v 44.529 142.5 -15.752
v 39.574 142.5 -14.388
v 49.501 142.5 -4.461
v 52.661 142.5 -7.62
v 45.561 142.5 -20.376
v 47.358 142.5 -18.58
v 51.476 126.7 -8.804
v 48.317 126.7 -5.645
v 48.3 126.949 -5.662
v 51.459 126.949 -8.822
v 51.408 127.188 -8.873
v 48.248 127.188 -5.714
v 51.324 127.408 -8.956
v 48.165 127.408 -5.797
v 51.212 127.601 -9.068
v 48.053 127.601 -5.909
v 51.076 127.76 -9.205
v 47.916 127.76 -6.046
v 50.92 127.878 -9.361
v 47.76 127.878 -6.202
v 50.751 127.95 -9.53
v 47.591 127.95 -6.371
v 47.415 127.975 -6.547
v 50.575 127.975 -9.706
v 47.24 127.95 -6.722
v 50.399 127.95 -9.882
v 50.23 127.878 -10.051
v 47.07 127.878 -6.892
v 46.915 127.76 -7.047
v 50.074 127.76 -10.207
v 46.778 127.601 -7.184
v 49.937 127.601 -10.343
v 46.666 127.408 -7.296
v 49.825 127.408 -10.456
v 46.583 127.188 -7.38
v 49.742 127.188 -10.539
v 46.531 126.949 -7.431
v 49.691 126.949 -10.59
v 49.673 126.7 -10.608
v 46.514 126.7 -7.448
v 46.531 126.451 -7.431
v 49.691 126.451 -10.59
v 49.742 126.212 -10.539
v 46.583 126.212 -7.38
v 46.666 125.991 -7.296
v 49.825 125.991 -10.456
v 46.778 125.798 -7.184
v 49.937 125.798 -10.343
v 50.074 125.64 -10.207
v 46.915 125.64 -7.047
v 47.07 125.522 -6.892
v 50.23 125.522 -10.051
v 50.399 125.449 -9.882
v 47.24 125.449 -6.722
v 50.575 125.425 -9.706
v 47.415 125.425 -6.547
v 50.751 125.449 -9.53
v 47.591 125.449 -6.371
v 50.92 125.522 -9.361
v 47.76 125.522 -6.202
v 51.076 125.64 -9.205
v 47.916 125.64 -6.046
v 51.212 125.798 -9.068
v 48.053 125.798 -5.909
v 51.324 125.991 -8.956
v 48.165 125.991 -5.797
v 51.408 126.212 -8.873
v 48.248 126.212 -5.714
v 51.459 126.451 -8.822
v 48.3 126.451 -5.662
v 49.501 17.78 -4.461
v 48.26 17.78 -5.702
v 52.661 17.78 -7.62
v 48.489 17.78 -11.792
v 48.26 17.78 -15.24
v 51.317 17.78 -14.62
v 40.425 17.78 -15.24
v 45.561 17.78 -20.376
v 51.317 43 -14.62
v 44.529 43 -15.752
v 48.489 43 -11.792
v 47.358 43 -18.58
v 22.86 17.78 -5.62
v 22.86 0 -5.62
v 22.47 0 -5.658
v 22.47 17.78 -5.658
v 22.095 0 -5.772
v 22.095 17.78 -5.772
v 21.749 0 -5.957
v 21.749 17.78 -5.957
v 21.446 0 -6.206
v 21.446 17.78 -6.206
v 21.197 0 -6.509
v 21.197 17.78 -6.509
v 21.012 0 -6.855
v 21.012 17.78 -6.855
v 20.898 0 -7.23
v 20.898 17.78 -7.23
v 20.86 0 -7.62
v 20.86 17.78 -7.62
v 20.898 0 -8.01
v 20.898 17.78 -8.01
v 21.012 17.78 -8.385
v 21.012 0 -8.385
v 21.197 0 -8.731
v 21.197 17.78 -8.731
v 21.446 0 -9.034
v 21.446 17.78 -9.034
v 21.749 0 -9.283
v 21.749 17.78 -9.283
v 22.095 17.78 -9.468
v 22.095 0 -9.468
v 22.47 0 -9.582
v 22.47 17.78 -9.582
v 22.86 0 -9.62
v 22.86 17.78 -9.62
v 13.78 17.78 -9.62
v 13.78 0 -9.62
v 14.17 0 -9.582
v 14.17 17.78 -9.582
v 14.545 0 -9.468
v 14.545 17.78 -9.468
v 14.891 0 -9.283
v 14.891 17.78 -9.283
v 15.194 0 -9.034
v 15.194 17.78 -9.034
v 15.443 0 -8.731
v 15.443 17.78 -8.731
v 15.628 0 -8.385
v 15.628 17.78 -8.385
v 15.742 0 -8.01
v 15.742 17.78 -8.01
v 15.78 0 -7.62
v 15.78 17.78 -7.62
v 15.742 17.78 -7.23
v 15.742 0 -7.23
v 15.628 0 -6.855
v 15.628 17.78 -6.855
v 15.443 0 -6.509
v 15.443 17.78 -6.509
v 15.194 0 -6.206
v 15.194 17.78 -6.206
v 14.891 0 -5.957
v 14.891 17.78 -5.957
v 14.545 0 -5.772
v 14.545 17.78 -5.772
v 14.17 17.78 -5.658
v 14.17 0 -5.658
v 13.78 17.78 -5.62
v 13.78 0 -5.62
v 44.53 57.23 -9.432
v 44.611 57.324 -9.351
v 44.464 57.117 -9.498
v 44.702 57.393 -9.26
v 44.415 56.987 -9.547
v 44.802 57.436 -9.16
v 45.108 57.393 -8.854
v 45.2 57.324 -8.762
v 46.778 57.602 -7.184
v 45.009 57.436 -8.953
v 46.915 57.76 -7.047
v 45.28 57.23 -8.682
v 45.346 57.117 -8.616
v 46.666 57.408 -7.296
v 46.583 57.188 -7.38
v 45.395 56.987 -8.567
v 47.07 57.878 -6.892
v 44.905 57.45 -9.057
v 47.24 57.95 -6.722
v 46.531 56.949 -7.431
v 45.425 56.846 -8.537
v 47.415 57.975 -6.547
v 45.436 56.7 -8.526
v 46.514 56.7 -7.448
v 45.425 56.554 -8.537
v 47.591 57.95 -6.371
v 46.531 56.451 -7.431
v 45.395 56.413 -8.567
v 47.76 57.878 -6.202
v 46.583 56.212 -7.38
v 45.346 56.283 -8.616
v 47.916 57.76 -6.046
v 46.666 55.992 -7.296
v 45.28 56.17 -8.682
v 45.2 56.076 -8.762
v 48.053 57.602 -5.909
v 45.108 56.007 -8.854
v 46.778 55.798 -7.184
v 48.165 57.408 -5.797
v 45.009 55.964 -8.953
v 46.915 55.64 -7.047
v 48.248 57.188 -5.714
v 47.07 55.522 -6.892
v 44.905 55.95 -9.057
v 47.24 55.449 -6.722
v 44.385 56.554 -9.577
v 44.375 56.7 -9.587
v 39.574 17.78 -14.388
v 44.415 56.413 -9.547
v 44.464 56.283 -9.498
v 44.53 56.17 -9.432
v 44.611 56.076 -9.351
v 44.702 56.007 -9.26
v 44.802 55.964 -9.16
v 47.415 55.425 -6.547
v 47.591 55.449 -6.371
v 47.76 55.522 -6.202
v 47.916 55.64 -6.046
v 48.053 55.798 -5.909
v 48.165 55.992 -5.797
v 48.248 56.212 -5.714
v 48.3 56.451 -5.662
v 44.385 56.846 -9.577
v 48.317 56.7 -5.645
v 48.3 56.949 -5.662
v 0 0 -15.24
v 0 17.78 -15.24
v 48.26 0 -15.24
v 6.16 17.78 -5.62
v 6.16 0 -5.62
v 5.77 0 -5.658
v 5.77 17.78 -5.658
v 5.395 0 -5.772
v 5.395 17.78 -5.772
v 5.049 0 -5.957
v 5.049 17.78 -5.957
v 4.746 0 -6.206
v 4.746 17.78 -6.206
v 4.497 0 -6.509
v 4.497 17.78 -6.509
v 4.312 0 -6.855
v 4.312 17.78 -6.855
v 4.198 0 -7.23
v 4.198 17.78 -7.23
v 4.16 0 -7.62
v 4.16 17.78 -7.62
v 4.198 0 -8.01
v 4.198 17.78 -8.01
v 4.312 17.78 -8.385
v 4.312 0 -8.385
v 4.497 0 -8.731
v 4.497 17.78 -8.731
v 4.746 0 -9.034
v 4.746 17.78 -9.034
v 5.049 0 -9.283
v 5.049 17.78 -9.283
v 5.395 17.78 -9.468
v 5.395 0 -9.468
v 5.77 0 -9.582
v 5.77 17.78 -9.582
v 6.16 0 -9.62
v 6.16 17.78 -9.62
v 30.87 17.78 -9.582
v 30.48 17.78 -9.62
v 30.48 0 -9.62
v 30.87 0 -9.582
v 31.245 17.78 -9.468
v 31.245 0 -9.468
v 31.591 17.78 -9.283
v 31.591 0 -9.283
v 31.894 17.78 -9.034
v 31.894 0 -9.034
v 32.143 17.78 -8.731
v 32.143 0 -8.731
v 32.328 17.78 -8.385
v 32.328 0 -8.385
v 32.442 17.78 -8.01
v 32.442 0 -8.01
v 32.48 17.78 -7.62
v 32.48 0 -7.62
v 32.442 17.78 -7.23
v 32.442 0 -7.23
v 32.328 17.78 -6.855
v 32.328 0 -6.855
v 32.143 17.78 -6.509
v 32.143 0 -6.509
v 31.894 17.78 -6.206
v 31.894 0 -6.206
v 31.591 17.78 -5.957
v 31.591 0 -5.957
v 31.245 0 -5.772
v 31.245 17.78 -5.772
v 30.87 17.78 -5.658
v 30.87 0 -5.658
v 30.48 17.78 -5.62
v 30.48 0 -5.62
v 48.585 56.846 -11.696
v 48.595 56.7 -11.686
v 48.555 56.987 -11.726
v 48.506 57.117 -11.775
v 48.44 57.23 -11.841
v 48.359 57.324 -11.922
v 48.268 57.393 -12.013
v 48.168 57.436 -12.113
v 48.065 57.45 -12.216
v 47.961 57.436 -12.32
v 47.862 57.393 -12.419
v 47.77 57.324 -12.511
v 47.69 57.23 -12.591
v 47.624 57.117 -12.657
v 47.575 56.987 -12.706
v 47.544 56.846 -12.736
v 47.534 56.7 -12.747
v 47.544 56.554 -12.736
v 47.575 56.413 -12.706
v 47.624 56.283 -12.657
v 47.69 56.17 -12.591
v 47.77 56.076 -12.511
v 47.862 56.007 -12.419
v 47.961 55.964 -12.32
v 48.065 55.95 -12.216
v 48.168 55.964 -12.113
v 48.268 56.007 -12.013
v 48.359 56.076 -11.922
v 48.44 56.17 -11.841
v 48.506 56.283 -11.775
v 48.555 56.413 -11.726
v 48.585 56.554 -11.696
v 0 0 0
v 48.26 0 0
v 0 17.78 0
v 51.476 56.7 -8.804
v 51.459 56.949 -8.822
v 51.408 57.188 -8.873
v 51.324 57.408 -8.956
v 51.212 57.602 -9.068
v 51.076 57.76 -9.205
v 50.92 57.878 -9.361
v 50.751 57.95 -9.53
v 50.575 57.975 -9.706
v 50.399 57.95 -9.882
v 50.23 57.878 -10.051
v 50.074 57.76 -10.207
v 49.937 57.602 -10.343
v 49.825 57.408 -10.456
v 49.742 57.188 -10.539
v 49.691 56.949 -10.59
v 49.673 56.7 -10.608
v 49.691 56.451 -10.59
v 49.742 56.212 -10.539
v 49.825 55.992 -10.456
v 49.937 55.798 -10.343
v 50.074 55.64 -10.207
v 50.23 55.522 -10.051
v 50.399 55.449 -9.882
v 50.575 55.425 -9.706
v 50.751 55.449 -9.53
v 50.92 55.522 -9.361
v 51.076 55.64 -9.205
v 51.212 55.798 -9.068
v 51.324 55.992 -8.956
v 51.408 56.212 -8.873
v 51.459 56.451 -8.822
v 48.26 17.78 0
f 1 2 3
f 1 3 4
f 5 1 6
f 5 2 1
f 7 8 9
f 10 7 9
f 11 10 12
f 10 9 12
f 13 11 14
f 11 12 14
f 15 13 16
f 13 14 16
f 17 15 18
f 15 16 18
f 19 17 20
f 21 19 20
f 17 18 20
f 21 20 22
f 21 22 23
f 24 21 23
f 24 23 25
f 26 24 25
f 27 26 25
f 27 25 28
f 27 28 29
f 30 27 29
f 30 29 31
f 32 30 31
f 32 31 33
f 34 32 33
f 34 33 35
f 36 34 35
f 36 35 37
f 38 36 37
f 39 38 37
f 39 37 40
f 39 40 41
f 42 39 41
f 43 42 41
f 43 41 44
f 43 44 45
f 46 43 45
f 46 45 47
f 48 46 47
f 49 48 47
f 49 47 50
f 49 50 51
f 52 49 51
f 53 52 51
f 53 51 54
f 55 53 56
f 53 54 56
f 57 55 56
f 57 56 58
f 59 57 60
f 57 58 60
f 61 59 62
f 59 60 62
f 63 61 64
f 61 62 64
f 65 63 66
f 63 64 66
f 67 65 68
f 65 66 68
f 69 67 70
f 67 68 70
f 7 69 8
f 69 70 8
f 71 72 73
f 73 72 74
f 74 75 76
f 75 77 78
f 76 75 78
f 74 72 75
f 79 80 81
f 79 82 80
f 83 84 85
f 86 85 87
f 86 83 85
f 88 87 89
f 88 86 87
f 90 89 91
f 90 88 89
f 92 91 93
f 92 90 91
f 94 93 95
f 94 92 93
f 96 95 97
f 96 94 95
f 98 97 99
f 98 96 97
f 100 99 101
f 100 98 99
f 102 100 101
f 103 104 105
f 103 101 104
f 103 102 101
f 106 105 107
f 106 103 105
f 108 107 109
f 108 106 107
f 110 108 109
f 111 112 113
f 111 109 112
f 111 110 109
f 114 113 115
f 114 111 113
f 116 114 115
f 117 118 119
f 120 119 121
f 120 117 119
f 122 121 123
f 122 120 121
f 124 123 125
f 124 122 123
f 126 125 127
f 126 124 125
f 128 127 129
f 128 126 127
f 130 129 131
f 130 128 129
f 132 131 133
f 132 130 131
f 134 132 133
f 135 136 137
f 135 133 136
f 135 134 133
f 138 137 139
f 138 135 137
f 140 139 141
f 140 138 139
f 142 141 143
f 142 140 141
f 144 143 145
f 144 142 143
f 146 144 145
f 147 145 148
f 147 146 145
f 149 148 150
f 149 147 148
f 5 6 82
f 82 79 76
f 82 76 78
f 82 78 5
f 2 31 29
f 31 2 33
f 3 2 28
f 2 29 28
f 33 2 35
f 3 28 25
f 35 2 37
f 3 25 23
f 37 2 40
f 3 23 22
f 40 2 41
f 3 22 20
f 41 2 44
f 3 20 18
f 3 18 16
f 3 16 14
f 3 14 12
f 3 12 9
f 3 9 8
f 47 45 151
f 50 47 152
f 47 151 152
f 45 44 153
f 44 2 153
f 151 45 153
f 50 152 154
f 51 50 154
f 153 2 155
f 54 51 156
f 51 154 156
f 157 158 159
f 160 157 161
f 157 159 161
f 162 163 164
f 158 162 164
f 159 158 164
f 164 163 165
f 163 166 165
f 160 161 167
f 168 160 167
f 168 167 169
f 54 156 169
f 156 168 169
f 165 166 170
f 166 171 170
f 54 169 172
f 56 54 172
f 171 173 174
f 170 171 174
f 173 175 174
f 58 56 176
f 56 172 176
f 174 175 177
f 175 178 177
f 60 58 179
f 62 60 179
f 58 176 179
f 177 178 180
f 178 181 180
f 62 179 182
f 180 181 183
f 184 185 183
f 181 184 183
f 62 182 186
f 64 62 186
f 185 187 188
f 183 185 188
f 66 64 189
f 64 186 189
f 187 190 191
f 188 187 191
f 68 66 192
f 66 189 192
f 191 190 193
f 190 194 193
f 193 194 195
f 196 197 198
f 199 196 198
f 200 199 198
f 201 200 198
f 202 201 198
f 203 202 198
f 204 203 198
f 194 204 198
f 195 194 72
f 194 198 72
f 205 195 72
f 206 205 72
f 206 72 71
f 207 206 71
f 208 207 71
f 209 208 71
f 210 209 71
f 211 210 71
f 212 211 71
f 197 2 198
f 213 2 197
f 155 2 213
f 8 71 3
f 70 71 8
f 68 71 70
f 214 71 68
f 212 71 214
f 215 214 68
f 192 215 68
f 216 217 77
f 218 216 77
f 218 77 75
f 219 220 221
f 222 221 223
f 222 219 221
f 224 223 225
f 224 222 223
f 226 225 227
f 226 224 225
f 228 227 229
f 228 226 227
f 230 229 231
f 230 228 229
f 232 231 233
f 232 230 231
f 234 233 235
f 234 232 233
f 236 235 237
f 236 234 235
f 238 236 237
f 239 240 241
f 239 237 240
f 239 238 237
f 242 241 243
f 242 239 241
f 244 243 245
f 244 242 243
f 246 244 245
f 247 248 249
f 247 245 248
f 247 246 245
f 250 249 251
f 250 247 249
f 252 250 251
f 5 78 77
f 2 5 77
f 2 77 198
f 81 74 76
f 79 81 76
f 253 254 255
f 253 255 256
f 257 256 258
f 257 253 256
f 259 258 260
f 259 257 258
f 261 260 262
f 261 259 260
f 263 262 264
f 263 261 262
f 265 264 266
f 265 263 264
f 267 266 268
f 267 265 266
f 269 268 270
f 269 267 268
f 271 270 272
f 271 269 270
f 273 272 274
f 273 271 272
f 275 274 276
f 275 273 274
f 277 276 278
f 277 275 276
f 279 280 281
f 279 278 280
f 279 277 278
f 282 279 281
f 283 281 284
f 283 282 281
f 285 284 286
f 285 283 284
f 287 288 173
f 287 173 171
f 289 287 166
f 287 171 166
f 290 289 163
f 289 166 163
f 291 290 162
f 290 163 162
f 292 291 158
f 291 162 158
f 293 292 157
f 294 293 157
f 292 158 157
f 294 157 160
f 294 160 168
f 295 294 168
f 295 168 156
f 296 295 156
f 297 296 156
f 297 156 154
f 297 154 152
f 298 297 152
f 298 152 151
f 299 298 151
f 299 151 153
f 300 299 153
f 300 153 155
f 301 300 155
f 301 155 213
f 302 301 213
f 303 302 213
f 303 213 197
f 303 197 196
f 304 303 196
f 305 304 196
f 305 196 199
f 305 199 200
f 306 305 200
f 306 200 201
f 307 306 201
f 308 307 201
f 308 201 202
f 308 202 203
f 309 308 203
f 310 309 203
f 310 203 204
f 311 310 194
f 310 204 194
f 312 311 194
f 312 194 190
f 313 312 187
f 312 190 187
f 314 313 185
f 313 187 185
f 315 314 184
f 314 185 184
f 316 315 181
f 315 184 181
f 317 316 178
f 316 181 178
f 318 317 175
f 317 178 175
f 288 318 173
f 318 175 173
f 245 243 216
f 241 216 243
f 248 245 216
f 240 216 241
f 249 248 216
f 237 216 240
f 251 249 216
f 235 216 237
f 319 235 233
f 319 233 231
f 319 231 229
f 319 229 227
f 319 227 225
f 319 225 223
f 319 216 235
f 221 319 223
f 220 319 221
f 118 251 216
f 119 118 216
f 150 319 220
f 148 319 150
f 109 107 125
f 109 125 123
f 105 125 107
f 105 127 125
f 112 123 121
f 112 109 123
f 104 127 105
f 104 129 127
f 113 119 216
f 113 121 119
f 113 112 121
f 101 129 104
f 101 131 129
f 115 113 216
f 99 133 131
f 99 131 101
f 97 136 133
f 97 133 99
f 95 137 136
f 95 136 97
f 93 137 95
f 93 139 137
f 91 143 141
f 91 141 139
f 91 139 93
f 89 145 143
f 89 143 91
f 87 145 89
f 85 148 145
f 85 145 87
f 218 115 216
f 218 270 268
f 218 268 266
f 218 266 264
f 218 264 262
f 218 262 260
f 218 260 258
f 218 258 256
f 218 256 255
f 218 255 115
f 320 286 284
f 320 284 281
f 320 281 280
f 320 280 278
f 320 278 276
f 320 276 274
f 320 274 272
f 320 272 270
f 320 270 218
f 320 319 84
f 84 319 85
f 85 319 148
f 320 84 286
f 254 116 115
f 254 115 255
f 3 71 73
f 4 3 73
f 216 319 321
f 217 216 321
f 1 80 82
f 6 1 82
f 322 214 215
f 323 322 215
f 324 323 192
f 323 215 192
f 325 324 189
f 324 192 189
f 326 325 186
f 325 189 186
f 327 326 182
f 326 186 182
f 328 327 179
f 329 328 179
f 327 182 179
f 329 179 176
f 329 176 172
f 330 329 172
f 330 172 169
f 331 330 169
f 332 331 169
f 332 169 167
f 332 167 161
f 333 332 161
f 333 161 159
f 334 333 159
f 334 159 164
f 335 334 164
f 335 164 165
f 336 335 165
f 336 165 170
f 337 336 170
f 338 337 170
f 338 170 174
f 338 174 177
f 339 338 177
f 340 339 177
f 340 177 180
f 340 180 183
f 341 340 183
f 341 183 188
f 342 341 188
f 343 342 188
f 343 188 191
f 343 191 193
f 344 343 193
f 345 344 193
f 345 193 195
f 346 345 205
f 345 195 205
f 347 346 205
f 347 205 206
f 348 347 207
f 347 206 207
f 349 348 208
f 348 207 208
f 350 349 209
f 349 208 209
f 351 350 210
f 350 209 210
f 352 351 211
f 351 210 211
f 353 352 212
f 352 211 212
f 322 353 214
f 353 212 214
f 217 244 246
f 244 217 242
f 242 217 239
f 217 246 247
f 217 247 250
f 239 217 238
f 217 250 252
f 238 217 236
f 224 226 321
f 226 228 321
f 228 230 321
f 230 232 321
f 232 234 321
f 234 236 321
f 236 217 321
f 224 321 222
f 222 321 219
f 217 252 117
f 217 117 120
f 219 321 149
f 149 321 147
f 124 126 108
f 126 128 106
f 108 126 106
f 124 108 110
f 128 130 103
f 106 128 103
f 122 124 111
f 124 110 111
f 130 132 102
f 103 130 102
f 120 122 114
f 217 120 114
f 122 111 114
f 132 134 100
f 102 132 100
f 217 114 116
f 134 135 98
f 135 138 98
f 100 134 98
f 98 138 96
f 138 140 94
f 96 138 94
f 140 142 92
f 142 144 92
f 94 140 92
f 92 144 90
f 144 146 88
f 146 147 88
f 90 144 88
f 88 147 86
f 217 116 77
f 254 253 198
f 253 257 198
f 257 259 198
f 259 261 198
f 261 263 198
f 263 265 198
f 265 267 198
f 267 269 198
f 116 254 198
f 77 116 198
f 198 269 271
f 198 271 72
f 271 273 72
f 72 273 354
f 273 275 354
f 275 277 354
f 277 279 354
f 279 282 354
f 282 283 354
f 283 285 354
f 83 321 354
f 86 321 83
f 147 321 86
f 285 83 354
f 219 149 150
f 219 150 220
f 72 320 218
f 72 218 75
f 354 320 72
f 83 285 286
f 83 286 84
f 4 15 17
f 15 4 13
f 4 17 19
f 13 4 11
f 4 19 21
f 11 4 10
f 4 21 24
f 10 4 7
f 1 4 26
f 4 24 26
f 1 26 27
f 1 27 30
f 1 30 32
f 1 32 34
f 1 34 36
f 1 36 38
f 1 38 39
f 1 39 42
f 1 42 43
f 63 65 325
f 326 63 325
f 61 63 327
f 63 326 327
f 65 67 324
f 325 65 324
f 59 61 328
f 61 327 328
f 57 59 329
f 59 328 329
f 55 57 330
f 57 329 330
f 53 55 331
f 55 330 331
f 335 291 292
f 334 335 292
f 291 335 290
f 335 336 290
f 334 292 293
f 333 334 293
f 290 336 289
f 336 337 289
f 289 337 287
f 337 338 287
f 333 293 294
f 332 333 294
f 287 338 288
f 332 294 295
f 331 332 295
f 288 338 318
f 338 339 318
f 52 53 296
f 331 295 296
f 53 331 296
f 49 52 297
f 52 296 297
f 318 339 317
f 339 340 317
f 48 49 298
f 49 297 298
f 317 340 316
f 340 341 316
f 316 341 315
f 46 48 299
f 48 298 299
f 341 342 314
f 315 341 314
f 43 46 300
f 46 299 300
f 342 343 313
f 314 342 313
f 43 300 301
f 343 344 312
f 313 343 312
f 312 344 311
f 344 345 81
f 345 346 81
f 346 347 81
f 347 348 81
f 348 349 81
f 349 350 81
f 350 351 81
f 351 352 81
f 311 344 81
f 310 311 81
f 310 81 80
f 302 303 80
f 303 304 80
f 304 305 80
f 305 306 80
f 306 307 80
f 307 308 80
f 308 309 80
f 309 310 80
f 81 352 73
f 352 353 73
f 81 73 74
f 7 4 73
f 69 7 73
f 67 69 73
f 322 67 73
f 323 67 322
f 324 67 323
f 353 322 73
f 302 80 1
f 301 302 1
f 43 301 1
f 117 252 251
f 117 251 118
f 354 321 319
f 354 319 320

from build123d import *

# Parameters (mm, degrees)
SKETCH1_W                             = 48.26
SKETCH1_H                             = 17.78
BOSS_EXTRUDE1_DEPTH                   = 15.24
CUT_EXTRUDE2_DEPTH                    = 54.641528688
BOSS_EXTRUDE2_DEPTH                   = 124.7199944
BOSS_EXTRUDE4_DEPTH                   = 18.21999912
BOSS_EXTRUDE5_DEPTH                   = 25.2199902
F_1_5MM_DOWEL_HOLE1_D                 = 1.5
TAPPED_HOLE_FOR_M2_5X0_45_HELICOIL1_D = 2.55


with BuildPart() as part:
    # Sketch1 → Boss-Extrude1 (new body)
    with BuildSketch(Plane.XY):
        with Locations((24.13, 8.89)):
            Rectangle(SKETCH1_W, SKETCH1_H)
    extrude(amount=-BOSS_EXTRUDE1_DEPTH)

    # Sketch4 → Cut-Extrude2 (cut, through all)
    with BuildSketch(Plane(origin=(0, 17.78, 0), x_dir=(1, 0, 0), z_dir=(0, 1, 0))):
        with BuildLine():
            Line((30.48, 5.62), (22.86, 5.62))
            ThreePointArc((22.86, 5.62), (20.86, 7.62), (22.86, 9.62))
            Line((22.86, 9.62), (30.48, 9.62))
            ThreePointArc((30.48, 9.62), (32.48, 7.62), (30.48, 5.62))
        make_face()
        with BuildLine():
            Line((13.78, 5.62), (6.16, 5.62))
            ThreePointArc((6.16, 5.62), (4.16, 7.62), (6.16, 9.62))
            Line((6.16, 9.62), (13.78, 9.62))
            ThreePointArc((13.78, 9.62), (15.78, 7.62), (13.78, 5.62))
        make_face()
    extrude(amount=-CUT_EXTRUDE2_DEPTH, mode=Mode.SUBTRACT)

    # Sketch3 → Boss-Extrude2 (add)
    with BuildSketch(Plane(origin=(0, 17.78, 0), x_dir=(1, 0, 0), z_dir=(0, 1, 0))):
        Polygon((52.660828417, 7.619998743), (48.488883403, 11.791943757), (44.529097479, 15.751729681), (47.357520181, 18.580152383), (45.561468957, 20.376203607), (40.42526535, 15.24), (39.573657012, 14.388391662), (49.501439174, 4.4606095), align=None)
    extrude(amount=BOSS_EXTRUDE2_DEPTH)

    # Sketch3<7> → Boss-Extrude4 (add)
    with BuildSketch(Plane(origin=(0, 17.78, 0), x_dir=(1, 0, 0), z_dir=(0, 1, 0))):
        Polygon((39.573657012, 14.388391662), (40.42526535, 15.24), (45.561468957, 20.376203607), (47.357520181, 18.580152383), (44.529097479, 15.751729681), (52.660828417, 7.619998743), (49.501439174, 4.4606095), align=None)
    extrude(amount=BOSS_EXTRUDE4_DEPTH)

    # Sketch3<8> → Boss-Extrude5 (add)
    with BuildSketch(Plane(origin=(0, 17.78, 0), x_dir=(1, 0, 0), z_dir=(0, 1, 0))):
        Polygon((44.529097479, 15.751729681), (48.488883403, 11.791943757), (51.317306105, 14.620366459), (47.357520181, 18.580152383), align=None)
    extrude(amount=BOSS_EXTRUDE5_DEPTH)

    # Ø1.5mm Dowel Hole1 (through all)
    with Locations(Plane(origin=(30.14041358, 0, -30.14041358), x_dir=(-0.707106781186544, 0, -0.7071067811865511), z_dir=(0.7071067811865511, 0, -0.707106781186544))):
        with Locations((-25.348661915, 56.6999882)):
            Hole(F_1_5MM_DOWEL_HOLE1_D / 2)

    # Tapped Hole for M2.5x0.45 Helicoil1 (through all)
    with Locations(Plane(origin=(30.14041358, 0, -30.14041358), x_dir=(-0.7071067811865478, 0, -0.7071067811865472), z_dir=(0.7071067811865472, 0, -0.7071067811865478))):
        with Locations((-28.898667515, 56.6999882), (-28.898667515, 126.6998482)):
            Hole(TAPPED_HOLE_FOR_M2_5X0_45_HELICOIL1_D / 2)


solid = part.part
